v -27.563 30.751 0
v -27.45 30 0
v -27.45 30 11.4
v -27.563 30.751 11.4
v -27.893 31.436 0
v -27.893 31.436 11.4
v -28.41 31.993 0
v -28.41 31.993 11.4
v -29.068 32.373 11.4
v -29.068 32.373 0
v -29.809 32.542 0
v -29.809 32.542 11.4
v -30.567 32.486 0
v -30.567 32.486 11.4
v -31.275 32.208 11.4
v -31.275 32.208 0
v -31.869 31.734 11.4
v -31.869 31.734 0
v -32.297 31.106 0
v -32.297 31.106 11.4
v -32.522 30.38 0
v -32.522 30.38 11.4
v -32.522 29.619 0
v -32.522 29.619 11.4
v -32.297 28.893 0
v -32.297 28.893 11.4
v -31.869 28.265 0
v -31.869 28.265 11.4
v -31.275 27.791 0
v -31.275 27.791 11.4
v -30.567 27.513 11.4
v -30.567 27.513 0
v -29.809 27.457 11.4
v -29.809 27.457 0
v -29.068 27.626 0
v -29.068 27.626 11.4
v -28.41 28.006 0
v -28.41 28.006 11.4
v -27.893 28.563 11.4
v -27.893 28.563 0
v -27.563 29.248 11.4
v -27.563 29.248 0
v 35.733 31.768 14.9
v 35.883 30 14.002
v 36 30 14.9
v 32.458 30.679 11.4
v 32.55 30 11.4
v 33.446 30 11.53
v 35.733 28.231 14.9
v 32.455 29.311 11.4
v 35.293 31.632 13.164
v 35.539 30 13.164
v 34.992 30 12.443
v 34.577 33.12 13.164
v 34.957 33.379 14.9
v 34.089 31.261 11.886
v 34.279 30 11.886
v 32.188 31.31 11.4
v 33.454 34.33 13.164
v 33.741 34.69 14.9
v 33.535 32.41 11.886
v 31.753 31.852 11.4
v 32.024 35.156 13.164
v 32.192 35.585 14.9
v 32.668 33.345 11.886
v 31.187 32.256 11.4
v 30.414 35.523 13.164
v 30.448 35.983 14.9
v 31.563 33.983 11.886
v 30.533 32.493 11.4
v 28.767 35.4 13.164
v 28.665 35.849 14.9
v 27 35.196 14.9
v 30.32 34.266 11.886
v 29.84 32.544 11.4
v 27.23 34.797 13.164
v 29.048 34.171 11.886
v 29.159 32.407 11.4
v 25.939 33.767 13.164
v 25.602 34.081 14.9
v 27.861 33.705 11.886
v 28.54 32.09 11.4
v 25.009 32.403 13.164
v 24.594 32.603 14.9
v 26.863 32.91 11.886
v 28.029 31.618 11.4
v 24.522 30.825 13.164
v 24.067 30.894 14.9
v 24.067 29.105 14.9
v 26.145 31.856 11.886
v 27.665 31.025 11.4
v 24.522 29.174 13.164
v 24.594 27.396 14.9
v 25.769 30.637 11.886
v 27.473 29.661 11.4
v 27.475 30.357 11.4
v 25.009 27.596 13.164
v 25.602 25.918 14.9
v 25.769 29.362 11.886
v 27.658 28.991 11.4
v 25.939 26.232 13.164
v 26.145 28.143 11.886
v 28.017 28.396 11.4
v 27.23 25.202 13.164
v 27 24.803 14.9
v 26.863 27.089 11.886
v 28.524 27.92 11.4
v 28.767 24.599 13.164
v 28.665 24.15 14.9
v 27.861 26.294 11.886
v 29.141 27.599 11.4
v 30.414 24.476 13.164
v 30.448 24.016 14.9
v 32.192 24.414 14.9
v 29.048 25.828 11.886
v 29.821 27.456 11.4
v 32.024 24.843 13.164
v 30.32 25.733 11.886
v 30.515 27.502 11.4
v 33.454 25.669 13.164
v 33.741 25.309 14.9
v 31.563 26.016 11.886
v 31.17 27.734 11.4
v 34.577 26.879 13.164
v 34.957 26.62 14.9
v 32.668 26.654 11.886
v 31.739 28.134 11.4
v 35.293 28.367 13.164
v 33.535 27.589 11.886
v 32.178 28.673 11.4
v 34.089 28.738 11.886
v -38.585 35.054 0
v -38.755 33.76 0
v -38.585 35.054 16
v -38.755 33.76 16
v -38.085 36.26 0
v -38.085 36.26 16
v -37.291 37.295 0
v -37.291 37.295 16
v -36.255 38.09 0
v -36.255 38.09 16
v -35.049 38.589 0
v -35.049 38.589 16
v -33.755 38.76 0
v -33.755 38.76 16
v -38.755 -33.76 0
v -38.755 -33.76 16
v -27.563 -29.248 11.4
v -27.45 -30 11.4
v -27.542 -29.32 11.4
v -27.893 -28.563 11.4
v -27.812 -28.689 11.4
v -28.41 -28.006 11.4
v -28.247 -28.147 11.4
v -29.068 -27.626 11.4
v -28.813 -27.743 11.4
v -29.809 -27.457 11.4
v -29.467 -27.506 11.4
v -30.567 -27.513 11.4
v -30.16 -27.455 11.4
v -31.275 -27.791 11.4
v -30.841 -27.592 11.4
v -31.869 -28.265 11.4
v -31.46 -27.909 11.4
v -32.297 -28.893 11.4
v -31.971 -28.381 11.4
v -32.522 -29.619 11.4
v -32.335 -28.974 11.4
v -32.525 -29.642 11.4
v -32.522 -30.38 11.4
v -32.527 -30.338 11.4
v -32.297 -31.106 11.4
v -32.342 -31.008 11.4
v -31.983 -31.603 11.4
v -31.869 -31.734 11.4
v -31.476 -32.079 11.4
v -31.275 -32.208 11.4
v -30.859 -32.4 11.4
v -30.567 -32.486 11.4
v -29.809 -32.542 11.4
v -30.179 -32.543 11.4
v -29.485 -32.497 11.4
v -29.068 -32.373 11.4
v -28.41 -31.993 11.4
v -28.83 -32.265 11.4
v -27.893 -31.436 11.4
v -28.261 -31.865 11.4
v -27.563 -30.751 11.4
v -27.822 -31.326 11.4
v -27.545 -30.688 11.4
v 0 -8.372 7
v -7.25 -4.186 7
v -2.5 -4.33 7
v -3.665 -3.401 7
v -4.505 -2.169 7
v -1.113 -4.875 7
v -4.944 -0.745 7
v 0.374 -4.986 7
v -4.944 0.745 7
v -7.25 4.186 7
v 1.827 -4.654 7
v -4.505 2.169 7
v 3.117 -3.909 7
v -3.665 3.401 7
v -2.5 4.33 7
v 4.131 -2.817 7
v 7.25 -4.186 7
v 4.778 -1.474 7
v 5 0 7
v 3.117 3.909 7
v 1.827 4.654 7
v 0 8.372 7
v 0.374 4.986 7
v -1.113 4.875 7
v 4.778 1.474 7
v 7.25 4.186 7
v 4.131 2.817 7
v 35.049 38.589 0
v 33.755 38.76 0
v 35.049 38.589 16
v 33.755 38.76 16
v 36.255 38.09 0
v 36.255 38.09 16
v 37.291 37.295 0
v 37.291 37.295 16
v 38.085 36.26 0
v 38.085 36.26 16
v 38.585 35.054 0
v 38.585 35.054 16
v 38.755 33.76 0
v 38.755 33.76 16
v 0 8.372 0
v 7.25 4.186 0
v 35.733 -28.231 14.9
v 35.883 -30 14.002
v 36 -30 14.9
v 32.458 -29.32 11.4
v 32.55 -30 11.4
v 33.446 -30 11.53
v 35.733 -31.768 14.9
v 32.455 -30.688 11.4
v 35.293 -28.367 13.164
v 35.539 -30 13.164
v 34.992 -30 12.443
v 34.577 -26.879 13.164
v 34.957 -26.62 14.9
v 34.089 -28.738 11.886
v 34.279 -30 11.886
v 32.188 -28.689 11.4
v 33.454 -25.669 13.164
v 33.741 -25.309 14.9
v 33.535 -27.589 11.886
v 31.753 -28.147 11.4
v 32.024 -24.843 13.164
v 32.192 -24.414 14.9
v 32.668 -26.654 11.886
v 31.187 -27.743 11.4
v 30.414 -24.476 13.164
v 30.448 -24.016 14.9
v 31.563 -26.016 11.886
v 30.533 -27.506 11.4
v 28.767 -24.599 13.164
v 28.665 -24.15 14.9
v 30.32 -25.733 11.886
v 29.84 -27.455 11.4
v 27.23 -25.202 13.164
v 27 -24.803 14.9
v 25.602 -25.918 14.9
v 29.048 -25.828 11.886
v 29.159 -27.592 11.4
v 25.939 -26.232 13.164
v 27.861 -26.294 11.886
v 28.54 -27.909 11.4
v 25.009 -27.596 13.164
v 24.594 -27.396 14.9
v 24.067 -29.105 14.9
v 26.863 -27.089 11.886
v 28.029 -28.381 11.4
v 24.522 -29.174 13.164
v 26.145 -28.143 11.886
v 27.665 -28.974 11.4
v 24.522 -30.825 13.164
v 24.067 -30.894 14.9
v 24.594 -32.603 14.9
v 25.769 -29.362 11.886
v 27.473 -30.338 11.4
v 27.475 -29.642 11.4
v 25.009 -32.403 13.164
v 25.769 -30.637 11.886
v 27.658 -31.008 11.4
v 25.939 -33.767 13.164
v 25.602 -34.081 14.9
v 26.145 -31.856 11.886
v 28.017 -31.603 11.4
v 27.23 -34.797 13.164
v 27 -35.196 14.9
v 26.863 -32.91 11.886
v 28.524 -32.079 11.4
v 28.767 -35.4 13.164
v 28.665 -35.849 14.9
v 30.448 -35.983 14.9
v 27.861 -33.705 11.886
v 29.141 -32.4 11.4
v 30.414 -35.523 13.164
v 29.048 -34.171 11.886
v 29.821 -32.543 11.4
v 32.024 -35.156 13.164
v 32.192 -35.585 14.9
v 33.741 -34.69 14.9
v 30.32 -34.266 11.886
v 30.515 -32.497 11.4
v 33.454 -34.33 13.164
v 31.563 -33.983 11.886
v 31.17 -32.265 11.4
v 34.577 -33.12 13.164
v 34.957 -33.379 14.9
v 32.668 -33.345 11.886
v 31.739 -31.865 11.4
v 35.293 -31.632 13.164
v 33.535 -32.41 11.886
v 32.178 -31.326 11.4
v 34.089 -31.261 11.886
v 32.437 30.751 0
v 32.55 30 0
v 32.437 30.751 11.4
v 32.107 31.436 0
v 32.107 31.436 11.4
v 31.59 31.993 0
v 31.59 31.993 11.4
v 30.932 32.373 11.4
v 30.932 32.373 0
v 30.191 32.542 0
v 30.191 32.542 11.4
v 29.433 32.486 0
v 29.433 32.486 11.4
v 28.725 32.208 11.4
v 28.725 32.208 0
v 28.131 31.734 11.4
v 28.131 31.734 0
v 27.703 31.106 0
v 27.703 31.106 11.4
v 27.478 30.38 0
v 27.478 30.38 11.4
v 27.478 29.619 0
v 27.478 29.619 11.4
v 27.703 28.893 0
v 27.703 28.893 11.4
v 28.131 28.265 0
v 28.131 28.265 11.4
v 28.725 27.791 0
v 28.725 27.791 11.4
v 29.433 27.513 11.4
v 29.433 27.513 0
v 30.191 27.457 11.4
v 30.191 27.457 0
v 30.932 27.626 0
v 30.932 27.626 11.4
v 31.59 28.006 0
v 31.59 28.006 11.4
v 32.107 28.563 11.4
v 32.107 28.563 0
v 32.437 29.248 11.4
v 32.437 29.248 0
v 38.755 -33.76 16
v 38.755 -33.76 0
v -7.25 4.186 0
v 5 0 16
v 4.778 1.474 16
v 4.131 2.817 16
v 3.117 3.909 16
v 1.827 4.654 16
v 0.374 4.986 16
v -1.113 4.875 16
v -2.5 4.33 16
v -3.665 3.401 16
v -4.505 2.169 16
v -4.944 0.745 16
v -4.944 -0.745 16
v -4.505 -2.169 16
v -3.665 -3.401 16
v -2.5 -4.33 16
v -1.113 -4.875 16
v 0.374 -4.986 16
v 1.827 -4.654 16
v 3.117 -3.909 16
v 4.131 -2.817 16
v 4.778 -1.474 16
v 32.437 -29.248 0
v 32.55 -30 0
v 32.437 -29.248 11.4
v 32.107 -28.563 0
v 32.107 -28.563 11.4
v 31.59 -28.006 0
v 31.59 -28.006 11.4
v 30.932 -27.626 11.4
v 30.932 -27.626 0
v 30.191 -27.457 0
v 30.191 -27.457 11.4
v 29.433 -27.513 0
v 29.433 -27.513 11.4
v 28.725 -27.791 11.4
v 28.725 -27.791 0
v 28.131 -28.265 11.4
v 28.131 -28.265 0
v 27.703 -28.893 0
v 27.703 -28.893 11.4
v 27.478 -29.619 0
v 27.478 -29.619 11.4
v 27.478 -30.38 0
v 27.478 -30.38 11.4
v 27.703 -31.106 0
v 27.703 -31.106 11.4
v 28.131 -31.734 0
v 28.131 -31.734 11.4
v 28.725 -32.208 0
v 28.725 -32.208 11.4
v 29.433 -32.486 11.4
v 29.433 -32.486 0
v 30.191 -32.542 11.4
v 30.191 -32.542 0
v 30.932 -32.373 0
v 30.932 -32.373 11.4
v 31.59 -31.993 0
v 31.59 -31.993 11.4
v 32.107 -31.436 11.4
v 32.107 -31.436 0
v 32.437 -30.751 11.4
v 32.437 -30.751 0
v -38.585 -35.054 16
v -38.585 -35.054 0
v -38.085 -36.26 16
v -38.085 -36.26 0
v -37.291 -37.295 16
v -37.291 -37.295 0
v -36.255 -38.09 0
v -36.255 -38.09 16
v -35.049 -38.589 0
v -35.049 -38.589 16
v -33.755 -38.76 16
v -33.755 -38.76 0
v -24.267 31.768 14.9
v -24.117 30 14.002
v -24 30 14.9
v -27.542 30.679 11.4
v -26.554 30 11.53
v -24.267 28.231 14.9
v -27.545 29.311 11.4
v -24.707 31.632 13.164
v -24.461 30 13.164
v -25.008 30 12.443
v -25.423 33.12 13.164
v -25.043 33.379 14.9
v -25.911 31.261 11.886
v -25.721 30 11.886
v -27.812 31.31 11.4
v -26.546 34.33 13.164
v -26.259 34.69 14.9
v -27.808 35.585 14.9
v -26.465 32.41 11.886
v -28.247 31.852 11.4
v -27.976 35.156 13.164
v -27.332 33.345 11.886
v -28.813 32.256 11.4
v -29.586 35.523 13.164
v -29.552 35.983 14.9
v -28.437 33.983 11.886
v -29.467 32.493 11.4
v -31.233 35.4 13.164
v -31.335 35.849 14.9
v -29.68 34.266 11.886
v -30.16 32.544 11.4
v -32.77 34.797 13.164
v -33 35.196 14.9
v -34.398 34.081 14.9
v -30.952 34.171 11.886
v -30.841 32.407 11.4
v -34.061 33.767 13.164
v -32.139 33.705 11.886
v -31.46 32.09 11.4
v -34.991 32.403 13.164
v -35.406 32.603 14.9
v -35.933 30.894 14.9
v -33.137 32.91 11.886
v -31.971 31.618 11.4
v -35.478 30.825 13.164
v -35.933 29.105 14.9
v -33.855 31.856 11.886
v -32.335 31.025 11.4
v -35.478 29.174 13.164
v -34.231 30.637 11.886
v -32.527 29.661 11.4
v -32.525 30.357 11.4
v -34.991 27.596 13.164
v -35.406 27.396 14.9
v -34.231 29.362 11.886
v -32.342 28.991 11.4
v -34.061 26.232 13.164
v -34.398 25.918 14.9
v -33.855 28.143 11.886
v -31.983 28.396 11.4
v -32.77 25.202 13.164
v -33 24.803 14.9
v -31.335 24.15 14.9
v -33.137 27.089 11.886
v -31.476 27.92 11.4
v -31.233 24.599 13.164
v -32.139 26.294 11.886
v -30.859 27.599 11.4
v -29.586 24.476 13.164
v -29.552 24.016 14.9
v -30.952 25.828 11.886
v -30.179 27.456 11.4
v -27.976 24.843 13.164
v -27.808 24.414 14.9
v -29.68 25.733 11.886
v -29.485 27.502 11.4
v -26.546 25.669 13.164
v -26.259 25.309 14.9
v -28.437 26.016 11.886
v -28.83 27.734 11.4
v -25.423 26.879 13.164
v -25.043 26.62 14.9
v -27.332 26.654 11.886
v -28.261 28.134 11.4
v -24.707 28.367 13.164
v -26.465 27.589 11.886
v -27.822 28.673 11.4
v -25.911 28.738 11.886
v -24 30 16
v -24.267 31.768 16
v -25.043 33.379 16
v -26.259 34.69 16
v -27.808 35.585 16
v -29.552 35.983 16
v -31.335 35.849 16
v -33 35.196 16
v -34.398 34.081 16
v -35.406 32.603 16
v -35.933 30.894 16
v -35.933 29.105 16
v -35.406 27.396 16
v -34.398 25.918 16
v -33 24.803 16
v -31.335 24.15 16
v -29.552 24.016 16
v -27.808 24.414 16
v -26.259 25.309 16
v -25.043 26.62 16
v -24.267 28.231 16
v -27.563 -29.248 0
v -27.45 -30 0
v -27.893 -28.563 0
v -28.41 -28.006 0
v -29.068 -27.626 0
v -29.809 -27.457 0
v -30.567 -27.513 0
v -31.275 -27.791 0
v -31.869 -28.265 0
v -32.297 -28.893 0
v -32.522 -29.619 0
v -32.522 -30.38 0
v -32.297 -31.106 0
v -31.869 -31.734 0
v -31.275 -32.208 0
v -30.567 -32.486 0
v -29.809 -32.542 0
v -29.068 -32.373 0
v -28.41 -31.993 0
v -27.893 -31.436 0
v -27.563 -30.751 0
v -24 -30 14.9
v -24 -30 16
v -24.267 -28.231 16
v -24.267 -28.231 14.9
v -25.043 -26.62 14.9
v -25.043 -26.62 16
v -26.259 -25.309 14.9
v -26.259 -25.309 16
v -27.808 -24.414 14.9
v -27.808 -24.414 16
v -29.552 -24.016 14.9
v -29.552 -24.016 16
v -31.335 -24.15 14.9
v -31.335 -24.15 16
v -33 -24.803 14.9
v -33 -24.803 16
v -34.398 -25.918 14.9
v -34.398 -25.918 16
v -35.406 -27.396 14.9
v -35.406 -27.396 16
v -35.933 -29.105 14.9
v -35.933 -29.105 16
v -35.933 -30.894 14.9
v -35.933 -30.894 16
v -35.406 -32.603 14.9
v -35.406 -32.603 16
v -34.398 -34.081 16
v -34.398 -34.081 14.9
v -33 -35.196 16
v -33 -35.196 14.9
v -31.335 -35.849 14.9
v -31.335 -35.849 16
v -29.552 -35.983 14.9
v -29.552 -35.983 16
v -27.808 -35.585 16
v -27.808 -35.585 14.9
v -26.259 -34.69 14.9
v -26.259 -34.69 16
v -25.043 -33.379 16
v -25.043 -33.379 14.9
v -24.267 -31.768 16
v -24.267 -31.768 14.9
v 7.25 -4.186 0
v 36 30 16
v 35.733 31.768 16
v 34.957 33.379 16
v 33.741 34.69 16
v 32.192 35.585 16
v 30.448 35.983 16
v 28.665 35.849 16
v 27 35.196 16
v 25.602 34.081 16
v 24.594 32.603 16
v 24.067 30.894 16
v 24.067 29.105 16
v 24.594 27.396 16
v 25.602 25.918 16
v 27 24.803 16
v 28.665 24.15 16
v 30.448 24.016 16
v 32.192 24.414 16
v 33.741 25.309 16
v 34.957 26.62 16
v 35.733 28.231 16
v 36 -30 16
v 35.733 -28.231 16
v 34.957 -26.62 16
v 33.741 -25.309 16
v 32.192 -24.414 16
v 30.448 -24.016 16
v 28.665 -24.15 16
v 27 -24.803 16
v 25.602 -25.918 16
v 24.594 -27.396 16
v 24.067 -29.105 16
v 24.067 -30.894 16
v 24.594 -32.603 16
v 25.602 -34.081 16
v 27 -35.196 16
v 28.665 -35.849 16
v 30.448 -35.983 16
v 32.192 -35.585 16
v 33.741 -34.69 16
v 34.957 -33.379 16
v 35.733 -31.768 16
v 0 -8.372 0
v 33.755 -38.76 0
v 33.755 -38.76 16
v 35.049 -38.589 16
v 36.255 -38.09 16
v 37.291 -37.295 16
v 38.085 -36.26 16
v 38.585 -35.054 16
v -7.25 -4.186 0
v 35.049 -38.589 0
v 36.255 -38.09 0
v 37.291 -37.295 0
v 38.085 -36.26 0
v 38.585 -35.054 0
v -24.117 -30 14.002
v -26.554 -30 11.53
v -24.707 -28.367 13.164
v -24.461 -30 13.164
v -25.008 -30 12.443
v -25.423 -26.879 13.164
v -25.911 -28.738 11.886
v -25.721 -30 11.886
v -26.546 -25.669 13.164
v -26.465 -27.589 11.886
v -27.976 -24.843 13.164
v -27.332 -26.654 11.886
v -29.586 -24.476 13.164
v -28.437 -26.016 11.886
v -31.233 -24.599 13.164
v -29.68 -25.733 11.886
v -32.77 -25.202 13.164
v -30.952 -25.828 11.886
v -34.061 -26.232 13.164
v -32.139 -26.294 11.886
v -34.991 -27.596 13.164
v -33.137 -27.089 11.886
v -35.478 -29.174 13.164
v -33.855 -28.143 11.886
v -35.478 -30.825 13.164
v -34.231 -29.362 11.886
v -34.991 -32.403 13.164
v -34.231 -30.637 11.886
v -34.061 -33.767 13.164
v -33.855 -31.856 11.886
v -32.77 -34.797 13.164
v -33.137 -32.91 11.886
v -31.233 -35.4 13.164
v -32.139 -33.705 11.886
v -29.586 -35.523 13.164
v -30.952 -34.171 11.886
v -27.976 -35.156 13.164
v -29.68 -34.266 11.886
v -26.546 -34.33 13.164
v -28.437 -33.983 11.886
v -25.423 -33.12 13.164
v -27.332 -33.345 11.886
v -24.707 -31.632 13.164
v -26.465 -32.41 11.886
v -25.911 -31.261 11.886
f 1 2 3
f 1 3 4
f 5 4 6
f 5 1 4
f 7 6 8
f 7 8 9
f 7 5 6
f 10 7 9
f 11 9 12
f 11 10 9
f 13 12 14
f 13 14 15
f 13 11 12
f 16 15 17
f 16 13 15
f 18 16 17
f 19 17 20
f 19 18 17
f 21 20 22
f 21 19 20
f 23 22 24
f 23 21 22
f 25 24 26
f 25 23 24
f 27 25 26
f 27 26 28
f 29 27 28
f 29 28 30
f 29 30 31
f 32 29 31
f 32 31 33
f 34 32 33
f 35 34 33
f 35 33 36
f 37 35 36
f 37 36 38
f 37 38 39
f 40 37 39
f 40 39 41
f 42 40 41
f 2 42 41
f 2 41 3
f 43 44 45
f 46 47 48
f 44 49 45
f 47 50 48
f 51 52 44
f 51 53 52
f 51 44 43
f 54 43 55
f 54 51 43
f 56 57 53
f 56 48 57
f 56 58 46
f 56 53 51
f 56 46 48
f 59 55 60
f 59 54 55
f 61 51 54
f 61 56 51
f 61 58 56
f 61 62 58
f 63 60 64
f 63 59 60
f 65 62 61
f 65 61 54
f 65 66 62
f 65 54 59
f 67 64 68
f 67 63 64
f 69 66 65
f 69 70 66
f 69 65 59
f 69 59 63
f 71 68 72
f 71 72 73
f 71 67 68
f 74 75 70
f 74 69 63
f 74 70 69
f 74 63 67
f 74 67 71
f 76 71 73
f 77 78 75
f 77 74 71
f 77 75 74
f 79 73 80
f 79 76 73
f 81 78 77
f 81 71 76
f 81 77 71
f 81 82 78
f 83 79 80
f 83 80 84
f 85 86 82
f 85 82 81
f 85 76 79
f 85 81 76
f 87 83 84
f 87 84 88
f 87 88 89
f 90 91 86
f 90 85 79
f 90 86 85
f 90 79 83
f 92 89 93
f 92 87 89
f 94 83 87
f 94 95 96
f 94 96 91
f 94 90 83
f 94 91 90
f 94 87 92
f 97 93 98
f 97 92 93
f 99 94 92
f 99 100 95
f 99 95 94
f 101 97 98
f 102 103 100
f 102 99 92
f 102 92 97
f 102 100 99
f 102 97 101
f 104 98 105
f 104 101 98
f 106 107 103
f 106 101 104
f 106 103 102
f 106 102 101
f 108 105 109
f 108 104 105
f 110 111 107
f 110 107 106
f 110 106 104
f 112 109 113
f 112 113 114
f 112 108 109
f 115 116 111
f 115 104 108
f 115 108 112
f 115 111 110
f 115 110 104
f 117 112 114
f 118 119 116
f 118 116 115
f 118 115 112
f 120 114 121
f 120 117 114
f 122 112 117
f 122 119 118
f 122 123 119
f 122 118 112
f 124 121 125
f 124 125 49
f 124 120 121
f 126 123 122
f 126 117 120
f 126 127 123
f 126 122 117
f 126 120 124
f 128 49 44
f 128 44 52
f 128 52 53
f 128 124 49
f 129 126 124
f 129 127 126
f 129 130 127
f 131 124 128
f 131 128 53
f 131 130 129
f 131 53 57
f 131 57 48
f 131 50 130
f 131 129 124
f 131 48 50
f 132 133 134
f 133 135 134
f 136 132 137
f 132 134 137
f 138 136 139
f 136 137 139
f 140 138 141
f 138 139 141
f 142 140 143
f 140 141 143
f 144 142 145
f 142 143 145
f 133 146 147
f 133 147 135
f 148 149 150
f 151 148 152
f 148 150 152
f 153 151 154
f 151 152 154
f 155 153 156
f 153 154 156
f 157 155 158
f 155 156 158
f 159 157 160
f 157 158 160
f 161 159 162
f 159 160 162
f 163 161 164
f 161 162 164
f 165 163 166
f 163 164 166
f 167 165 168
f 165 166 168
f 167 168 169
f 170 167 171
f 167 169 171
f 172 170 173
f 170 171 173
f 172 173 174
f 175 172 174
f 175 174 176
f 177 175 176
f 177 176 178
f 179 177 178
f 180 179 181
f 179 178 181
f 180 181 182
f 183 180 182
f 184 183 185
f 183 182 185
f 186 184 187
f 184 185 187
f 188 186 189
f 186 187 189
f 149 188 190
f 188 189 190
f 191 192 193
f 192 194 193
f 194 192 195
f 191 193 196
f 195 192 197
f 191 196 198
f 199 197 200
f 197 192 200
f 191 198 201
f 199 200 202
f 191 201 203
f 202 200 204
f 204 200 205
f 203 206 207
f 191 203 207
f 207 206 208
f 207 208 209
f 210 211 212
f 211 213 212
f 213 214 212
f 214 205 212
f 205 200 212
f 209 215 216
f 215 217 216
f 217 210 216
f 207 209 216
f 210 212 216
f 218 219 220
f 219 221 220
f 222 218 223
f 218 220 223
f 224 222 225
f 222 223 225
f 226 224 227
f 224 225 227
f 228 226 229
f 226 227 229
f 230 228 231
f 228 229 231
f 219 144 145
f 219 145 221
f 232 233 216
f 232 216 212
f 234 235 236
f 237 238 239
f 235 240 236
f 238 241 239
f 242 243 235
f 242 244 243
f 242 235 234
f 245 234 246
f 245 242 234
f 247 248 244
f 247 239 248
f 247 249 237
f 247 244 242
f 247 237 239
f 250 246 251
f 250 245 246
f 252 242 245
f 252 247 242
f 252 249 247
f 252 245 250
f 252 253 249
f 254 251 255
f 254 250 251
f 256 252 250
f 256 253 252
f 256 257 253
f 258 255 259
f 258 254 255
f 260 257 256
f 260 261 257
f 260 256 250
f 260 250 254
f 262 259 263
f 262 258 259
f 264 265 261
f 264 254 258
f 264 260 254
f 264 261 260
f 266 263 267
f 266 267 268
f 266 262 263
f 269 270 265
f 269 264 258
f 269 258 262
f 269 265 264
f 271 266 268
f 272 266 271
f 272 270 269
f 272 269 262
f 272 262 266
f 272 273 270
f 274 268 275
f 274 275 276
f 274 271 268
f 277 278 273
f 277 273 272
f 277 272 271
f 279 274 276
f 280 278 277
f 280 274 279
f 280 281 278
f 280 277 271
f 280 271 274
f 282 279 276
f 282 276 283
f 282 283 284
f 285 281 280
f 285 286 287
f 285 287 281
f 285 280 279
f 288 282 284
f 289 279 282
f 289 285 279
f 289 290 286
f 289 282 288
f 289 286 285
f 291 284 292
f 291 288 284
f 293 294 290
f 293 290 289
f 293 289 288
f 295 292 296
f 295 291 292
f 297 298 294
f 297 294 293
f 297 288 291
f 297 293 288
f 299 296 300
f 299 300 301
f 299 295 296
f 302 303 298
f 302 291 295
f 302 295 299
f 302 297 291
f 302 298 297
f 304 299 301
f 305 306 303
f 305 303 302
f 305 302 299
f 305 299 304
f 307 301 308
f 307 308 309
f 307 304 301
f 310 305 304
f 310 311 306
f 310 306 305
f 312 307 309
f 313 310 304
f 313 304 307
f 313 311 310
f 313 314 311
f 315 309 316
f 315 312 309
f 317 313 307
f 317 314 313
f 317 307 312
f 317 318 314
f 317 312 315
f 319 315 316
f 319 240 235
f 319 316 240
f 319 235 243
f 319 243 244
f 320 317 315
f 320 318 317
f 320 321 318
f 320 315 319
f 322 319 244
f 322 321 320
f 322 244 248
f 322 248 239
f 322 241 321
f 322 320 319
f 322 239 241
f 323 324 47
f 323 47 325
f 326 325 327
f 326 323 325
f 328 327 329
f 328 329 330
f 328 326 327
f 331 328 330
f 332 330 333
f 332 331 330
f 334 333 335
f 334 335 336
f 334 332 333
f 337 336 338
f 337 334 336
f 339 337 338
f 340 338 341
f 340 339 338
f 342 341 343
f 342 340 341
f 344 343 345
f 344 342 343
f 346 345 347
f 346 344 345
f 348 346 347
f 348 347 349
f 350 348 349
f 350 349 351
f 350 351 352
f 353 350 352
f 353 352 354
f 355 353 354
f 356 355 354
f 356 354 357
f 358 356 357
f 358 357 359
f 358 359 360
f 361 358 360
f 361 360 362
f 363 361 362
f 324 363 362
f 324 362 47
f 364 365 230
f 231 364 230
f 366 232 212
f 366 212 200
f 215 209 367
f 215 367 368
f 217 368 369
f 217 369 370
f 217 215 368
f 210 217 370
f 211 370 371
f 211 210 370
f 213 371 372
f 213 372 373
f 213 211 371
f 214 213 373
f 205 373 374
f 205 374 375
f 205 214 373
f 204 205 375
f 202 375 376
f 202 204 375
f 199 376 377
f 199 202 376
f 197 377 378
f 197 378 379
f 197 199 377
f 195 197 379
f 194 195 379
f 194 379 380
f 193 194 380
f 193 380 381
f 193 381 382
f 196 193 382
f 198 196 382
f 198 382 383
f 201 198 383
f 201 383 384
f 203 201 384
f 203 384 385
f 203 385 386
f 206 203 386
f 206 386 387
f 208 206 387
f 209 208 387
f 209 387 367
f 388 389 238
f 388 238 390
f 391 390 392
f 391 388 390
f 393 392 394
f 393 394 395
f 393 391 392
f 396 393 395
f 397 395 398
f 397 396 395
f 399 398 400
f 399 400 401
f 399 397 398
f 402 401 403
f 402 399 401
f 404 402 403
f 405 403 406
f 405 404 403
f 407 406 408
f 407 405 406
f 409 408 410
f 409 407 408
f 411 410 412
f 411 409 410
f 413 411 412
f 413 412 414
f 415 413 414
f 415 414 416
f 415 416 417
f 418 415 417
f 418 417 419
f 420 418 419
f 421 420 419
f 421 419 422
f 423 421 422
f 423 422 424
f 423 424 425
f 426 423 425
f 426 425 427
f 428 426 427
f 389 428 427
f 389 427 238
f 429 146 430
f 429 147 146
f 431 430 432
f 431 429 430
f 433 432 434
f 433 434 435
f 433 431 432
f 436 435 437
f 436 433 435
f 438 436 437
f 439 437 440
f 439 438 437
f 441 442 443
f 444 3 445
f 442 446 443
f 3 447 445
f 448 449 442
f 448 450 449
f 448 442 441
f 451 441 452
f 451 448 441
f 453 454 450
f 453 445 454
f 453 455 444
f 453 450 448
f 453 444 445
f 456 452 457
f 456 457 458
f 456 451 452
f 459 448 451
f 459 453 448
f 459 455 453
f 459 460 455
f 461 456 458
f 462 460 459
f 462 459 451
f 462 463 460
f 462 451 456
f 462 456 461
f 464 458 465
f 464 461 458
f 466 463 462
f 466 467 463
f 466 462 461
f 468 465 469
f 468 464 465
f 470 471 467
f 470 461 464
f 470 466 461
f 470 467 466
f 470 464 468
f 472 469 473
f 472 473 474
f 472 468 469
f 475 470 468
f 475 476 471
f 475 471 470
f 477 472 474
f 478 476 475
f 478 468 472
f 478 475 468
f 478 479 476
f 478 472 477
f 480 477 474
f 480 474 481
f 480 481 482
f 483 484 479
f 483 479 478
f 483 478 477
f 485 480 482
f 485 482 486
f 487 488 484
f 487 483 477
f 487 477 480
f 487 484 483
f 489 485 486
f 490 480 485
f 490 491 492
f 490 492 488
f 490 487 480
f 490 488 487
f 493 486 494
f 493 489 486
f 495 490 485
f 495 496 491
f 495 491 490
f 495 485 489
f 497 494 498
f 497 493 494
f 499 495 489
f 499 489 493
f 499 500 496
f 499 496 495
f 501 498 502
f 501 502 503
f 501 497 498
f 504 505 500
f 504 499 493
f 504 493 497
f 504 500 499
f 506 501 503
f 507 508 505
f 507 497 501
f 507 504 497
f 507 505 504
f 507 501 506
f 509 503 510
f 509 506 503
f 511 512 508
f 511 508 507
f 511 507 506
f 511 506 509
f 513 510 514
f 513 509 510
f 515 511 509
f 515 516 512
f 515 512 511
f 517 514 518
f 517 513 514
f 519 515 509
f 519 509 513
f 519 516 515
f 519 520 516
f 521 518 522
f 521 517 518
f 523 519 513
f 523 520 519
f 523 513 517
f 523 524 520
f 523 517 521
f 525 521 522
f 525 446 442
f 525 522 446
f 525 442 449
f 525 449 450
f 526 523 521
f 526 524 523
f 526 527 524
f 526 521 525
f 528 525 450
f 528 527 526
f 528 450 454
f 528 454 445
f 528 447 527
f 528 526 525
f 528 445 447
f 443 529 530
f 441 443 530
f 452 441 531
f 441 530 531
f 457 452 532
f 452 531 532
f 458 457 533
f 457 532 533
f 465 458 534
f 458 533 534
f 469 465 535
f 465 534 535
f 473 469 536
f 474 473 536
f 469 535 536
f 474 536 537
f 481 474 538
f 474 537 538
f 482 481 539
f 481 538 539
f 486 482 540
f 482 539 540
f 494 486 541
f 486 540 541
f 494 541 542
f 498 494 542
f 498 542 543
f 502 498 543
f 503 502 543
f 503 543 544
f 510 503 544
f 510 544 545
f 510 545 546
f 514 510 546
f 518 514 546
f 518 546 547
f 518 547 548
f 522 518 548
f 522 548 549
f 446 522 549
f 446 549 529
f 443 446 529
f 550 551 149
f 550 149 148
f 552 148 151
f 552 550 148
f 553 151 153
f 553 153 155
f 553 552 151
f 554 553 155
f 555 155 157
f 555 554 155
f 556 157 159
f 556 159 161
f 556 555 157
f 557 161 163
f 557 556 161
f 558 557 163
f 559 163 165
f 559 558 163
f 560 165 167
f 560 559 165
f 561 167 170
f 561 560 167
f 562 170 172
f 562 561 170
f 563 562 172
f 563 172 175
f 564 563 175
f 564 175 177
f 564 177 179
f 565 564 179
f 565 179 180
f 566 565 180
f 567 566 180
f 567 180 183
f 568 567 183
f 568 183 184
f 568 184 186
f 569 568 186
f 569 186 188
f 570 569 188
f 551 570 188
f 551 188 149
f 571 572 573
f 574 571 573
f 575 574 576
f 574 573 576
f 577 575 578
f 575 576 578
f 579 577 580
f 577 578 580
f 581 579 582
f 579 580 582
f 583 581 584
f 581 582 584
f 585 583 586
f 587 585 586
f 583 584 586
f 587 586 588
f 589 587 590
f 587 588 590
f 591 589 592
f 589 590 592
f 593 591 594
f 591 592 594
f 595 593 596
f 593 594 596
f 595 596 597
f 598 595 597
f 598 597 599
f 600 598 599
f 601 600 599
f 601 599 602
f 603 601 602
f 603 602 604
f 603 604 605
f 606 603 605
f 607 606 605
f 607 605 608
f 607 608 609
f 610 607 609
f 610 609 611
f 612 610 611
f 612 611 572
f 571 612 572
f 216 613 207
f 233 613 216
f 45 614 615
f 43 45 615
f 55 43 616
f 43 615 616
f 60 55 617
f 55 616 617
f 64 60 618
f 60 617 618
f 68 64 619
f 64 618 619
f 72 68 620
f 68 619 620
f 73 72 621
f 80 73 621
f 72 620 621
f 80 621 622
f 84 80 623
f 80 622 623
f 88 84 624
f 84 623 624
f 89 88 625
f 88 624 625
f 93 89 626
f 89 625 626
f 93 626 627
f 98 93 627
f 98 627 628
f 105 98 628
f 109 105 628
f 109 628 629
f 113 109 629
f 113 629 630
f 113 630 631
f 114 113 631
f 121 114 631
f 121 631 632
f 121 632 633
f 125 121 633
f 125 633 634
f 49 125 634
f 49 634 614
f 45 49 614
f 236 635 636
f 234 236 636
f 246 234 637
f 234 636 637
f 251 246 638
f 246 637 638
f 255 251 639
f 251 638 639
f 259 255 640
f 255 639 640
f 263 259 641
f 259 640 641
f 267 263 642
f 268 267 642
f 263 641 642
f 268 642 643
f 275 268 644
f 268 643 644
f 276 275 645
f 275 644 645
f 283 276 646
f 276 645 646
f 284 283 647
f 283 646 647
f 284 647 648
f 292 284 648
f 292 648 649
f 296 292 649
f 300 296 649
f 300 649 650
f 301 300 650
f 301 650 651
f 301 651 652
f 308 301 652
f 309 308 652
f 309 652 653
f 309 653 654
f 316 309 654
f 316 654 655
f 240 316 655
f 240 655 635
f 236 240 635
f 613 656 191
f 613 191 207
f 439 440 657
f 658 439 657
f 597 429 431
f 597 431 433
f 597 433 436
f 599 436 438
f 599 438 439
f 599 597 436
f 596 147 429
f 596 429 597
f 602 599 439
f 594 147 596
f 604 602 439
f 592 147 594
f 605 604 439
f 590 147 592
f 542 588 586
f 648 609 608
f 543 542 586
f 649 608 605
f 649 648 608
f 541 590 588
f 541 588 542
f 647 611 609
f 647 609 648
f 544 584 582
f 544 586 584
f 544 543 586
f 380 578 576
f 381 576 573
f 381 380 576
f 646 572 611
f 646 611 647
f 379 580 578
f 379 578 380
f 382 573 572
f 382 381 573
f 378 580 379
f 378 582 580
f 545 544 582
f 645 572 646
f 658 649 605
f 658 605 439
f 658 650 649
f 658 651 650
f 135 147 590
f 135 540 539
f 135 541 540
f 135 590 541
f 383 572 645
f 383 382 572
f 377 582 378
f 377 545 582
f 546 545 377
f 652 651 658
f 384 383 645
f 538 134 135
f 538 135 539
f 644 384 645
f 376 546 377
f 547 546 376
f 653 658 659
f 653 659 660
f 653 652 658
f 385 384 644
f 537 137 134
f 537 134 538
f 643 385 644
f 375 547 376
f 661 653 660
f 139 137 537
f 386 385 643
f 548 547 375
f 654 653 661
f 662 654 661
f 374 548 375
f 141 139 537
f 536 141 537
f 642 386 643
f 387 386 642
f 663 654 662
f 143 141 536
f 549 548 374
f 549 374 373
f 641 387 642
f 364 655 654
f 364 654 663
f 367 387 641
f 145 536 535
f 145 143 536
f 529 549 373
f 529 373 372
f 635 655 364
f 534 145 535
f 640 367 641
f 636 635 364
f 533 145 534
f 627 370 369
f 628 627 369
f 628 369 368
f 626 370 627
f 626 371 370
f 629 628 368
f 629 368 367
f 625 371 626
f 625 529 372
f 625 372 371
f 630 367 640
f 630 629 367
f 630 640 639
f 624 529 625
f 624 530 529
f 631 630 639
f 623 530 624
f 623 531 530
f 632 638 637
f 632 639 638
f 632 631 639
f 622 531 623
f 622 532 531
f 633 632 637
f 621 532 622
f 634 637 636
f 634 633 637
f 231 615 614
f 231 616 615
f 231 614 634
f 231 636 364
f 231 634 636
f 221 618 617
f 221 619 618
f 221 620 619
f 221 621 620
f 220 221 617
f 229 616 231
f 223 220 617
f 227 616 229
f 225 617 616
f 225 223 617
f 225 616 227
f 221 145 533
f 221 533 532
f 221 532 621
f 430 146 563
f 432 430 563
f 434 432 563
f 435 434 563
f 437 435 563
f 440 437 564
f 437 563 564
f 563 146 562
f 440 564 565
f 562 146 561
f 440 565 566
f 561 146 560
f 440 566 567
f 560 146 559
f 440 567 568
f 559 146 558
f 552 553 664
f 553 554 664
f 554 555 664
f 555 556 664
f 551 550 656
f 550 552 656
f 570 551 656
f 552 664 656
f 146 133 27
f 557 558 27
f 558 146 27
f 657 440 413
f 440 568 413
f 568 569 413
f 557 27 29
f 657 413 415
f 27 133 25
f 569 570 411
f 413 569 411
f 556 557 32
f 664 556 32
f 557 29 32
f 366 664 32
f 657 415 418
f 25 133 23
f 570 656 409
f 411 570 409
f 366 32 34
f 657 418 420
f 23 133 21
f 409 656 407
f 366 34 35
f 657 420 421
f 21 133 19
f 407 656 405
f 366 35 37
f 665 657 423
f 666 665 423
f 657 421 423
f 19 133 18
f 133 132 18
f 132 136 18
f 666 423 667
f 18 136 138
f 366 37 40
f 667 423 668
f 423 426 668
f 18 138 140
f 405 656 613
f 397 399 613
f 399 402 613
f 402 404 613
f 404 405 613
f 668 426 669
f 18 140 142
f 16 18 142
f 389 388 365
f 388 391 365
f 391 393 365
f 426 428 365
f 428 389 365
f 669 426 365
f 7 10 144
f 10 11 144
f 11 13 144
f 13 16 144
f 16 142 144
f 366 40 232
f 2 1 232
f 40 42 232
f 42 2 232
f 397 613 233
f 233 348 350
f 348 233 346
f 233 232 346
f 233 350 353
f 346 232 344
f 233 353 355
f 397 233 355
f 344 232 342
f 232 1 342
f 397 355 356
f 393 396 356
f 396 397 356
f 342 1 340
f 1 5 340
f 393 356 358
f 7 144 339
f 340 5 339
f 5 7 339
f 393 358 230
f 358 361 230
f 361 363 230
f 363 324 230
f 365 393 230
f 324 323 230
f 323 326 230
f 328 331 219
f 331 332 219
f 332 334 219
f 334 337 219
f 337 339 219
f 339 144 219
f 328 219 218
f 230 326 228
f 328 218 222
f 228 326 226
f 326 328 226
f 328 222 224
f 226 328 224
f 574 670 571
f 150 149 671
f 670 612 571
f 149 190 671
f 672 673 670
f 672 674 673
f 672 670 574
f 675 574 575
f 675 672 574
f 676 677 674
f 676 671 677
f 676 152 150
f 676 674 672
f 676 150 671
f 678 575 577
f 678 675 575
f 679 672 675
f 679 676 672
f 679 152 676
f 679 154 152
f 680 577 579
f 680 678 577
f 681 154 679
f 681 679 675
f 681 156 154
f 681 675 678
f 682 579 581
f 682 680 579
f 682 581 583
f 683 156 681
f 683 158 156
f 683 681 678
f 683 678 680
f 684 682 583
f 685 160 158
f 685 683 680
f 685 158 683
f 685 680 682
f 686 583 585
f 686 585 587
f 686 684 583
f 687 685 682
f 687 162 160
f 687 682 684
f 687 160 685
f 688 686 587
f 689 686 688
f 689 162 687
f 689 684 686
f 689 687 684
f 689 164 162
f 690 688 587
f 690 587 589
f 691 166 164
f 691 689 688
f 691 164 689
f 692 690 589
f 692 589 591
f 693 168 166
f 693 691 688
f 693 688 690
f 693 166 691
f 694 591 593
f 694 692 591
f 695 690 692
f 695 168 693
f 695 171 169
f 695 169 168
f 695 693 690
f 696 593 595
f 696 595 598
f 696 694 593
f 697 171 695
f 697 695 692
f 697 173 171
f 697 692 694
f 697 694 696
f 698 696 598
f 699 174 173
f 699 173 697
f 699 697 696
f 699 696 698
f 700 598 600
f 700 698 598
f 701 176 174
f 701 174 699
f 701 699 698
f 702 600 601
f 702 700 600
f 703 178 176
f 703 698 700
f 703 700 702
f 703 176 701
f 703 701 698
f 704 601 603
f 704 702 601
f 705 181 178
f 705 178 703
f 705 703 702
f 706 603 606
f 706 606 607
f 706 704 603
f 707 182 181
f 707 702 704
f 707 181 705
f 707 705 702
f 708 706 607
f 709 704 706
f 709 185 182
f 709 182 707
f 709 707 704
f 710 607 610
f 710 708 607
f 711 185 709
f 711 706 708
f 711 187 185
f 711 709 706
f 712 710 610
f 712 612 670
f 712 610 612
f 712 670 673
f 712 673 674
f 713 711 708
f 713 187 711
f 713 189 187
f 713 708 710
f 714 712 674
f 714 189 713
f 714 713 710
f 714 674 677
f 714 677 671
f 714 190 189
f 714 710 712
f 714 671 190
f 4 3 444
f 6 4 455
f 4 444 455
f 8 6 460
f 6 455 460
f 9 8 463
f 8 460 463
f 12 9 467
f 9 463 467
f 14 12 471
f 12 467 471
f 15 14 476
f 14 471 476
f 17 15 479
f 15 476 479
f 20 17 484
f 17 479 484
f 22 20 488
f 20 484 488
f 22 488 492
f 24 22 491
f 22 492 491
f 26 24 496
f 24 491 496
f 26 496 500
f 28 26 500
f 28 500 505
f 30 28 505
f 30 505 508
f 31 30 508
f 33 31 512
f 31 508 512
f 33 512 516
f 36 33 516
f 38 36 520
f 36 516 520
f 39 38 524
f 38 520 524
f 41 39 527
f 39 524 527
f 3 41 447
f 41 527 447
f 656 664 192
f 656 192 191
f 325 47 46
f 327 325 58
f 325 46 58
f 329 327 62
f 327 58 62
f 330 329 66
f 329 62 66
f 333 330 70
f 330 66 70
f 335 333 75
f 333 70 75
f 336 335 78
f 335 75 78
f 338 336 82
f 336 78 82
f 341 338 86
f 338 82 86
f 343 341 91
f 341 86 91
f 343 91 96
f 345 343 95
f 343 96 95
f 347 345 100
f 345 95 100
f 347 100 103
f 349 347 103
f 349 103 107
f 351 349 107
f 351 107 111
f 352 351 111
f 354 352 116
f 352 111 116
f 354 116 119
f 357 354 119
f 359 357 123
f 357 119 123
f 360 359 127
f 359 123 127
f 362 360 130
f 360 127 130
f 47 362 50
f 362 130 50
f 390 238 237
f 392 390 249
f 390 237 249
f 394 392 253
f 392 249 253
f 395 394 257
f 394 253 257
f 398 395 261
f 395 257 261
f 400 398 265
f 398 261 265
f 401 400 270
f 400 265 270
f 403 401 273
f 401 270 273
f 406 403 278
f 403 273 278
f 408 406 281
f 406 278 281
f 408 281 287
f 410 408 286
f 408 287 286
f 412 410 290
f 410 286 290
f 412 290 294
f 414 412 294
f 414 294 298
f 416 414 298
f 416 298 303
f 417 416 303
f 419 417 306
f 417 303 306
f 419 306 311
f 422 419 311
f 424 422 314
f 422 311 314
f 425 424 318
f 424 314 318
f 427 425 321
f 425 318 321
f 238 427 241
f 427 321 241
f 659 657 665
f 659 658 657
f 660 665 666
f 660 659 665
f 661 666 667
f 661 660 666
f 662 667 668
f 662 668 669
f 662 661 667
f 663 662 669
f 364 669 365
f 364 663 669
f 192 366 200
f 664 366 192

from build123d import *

# Parameters (mm, degrees)
F0_W         = 77.51
F0_H         = 77.519
F0_R         = 2.55
F0_R_2       = 5
F1_DEPTH     = 16
F2_DEPTH     = 7
F3_R         = 5
F4_R         = 6
F4_R_2       = 2.55
F5_DEPTH     = 4.6
F6_S5_R      = 2.55
F6_T6_DEPTH  = 10
F6_S11_R     = 2.55
F6_T12_DEPTH = 10
F6_S17_R     = 2.55
F6_T18_DEPTH = 10
F6_S23_R     = 2.55
F6_T24_DEPTH = 10


# Not quite as in the source:
# - a fillet or chamfer that OpenCascade refuses, or shapes differently, is made with other operations: its cross-section is extruded or revolved along the edge and cut away or added
# - a feature names something its author has since deleted; it is built from what else it names


with BuildPart() as f1:
    # F0 (on Top) → F1 (new body)
    with BuildSketch(Plane.XY):
        Rectangle(F0_W, F0_H)
        with Locations((-30, -29.9995)):
            Circle(F0_R, mode=Mode.SUBTRACT)
        with Locations((30, -29.9995)):
            Circle(F0_R, mode=Mode.SUBTRACT)
        with Locations((-30, 29.9995)):
            Circle(F0_R, mode=Mode.SUBTRACT)
        Polygon((7.25, -4.1857894516), (0, -8.3715789032), (-7.25, -4.1857894516), (-7.25, 4.1857894516), (0, 8.3715789032), (7.25, 4.1857894516), align=None, mode=Mode.SUBTRACT)
        with Locations((30, 29.9995)):
            Circle(F0_R, mode=Mode.SUBTRACT)
        Polygon((-7.25, -4.1857894516), (0, -8.3715789032), (7.25, -4.1857894516), (7.25, 4.1857894516), (0, 8.3715789032), (-7.25, 4.1857894516), align=None)
        Circle(F0_R_2, mode=Mode.SUBTRACT)
    extrude(amount=F1_DEPTH)

    # F0 (on Top) → F2 (cut)
    with BuildSketch(Plane.XY):
        Polygon((-7.25, -4.1857894516), (0, -8.3715789032), (7.25, -4.1857894516), (7.25, 4.1857894516), (0, 8.3715789032), (-7.25, 4.1857894516), align=None)
        Circle(F0_R_2, mode=Mode.SUBTRACT)
    extrude(amount=F2_DEPTH, mode=Mode.SUBTRACT)

    # F3
    f3_edges = [f1.edges().sort_by_distance(p)[0] for p in [
        (38.755, -38.7595, 8),
        (-38.755, -38.7595, 8),
        (38.755, 38.7595, 8),
        (-38.755, 38.7595, 8),
    ]]
    fillet(f3_edges, radius=F3_R)

    # F4 (on face) → F5 (cut)
    with BuildSketch(Plane.XY.offset(16)):
        with Locations((-30, 29.9995)):
            Circle(F4_R)
        with Locations((-30, 29.9995)):
            Circle(F4_R_2, mode=Mode.SUBTRACT)
        with Locations((30, 29.9995)):
            Circle(F4_R)
        with Locations((30, 29.9995)):
            Circle(F4_R_2, mode=Mode.SUBTRACT)
        with Locations((30, -29.9995)):
            Circle(F4_R)
        with Locations((30, -29.9995)):
            Circle(F4_R_2, mode=Mode.SUBTRACT)
        with Locations((-30, -29.9995)):
            Circle(F4_R)
        with Locations((-30, -29.9995)):
            Circle(F4_R_2, mode=Mode.SUBTRACT)
    extrude(amount=-F5_DEPTH, mode=Mode.SUBTRACT)

    # F6: fillet of radius 3.5 on 4 edges, made by hand


with BuildPart() as f6_tool2:
    # F6_s3 → F6_t4 (revolve)
    with BuildSketch(Plane.XZ.offset(29.9995)):
        with BuildLine():
            ThreePointArc((-24, 14.9), (-25.0251262658, 12.4251262658), (-27.5, 11.4))
            Line((-27.5, 11.4), (-24, 11.4))
            Line((-24, 11.4), (-24, 14.9))
        make_face()
    revolve(axis=Axis((-30, -29.9995, 11.4), (0, 0, 1)))

    # F6_s5 → F6_t6 (cut, symmetric)
    with BuildSketch(Plane.XY.offset(13.2)):
        with Locations((-30, -29.9995)):
            Circle(F6_S5_R)
    extrude(amount=F6_T6_DEPTH, both=True, mode=Mode.SUBTRACT)


with BuildPart() as f1_1:
    add(f1.part)

    # F6_t1: union F6_tool2
    add(f6_tool2.part)


with BuildPart() as f6_tool8:
    # F6_s9 → F6_t10 (revolve)
    with BuildSketch(Plane.XZ.offset(-29.9995)):
        with BuildLine():
            ThreePointArc((-24, 14.9), (-25.0251262658, 12.4251262658), (-27.5, 11.4))
            Line((-27.5, 11.4), (-24, 11.4))
            Line((-24, 11.4), (-24, 14.9))
        make_face()
    revolve(axis=Axis((-30, 29.9995, 11.4), (0, 0, 1)))

    # F6_s11 → F6_t12 (cut, symmetric)
    with BuildSketch(Plane.XY.offset(13.2)):
        with Locations((-30, 29.9995)):
            Circle(F6_S11_R)
    extrude(amount=F6_T12_DEPTH, both=True, mode=Mode.SUBTRACT)


with BuildPart() as f1_2:
    add(f1_1.part)

    # F6_t7: union F6_tool8
    add(f6_tool8.part)


with BuildPart() as f6_tool14:
    # F6_s15 → F6_t16 (revolve)
    with BuildSketch(Plane.XZ.offset(29.9995)):
        with BuildLine():
            ThreePointArc((36, 14.9), (34.9748737342, 12.4251262658), (32.5, 11.4))
            Line((32.5, 11.4), (36, 11.4))
            Line((36, 11.4), (36, 14.9))
        make_face()
    revolve(axis=Axis((30, -29.9995, 11.4), (0, 0, 1)))

    # F6_s17 → F6_t18 (cut, symmetric)
    with BuildSketch(Plane.XY.offset(13.2)):
        with Locations((30, -29.9995)):
            Circle(F6_S17_R)
    extrude(amount=F6_T18_DEPTH, both=True, mode=Mode.SUBTRACT)


with BuildPart() as f1_3:
    add(f1_2.part)

    # F6_t13: union F6_tool14
    add(f6_tool14.part)


with BuildPart() as f6_tool20:
    # F6_s21 → F6_t22 (revolve)
    with BuildSketch(Plane.XZ.offset(-29.9995)):
        with BuildLine():
            ThreePointArc((36, 14.9), (34.9748737342, 12.4251262658), (32.5, 11.4))
            Line((32.5, 11.4), (36, 11.4))
            Line((36, 11.4), (36, 14.9))
        make_face()
    revolve(axis=Axis((30, 29.9995, 11.4), (0, 0, 1)))

    # F6_s23 → F6_t24 (cut, symmetric)
    with BuildSketch(Plane.XY.offset(13.2)):
        with Locations((30, 29.9995)):
            Circle(F6_S23_R)
    extrude(amount=F6_T24_DEPTH, both=True, mode=Mode.SUBTRACT)


with BuildPart() as f1_4:
    add(f1_3.part)

    # F6_t19: union F6_tool20
    add(f6_tool20.part)


solid = f1_4.part
